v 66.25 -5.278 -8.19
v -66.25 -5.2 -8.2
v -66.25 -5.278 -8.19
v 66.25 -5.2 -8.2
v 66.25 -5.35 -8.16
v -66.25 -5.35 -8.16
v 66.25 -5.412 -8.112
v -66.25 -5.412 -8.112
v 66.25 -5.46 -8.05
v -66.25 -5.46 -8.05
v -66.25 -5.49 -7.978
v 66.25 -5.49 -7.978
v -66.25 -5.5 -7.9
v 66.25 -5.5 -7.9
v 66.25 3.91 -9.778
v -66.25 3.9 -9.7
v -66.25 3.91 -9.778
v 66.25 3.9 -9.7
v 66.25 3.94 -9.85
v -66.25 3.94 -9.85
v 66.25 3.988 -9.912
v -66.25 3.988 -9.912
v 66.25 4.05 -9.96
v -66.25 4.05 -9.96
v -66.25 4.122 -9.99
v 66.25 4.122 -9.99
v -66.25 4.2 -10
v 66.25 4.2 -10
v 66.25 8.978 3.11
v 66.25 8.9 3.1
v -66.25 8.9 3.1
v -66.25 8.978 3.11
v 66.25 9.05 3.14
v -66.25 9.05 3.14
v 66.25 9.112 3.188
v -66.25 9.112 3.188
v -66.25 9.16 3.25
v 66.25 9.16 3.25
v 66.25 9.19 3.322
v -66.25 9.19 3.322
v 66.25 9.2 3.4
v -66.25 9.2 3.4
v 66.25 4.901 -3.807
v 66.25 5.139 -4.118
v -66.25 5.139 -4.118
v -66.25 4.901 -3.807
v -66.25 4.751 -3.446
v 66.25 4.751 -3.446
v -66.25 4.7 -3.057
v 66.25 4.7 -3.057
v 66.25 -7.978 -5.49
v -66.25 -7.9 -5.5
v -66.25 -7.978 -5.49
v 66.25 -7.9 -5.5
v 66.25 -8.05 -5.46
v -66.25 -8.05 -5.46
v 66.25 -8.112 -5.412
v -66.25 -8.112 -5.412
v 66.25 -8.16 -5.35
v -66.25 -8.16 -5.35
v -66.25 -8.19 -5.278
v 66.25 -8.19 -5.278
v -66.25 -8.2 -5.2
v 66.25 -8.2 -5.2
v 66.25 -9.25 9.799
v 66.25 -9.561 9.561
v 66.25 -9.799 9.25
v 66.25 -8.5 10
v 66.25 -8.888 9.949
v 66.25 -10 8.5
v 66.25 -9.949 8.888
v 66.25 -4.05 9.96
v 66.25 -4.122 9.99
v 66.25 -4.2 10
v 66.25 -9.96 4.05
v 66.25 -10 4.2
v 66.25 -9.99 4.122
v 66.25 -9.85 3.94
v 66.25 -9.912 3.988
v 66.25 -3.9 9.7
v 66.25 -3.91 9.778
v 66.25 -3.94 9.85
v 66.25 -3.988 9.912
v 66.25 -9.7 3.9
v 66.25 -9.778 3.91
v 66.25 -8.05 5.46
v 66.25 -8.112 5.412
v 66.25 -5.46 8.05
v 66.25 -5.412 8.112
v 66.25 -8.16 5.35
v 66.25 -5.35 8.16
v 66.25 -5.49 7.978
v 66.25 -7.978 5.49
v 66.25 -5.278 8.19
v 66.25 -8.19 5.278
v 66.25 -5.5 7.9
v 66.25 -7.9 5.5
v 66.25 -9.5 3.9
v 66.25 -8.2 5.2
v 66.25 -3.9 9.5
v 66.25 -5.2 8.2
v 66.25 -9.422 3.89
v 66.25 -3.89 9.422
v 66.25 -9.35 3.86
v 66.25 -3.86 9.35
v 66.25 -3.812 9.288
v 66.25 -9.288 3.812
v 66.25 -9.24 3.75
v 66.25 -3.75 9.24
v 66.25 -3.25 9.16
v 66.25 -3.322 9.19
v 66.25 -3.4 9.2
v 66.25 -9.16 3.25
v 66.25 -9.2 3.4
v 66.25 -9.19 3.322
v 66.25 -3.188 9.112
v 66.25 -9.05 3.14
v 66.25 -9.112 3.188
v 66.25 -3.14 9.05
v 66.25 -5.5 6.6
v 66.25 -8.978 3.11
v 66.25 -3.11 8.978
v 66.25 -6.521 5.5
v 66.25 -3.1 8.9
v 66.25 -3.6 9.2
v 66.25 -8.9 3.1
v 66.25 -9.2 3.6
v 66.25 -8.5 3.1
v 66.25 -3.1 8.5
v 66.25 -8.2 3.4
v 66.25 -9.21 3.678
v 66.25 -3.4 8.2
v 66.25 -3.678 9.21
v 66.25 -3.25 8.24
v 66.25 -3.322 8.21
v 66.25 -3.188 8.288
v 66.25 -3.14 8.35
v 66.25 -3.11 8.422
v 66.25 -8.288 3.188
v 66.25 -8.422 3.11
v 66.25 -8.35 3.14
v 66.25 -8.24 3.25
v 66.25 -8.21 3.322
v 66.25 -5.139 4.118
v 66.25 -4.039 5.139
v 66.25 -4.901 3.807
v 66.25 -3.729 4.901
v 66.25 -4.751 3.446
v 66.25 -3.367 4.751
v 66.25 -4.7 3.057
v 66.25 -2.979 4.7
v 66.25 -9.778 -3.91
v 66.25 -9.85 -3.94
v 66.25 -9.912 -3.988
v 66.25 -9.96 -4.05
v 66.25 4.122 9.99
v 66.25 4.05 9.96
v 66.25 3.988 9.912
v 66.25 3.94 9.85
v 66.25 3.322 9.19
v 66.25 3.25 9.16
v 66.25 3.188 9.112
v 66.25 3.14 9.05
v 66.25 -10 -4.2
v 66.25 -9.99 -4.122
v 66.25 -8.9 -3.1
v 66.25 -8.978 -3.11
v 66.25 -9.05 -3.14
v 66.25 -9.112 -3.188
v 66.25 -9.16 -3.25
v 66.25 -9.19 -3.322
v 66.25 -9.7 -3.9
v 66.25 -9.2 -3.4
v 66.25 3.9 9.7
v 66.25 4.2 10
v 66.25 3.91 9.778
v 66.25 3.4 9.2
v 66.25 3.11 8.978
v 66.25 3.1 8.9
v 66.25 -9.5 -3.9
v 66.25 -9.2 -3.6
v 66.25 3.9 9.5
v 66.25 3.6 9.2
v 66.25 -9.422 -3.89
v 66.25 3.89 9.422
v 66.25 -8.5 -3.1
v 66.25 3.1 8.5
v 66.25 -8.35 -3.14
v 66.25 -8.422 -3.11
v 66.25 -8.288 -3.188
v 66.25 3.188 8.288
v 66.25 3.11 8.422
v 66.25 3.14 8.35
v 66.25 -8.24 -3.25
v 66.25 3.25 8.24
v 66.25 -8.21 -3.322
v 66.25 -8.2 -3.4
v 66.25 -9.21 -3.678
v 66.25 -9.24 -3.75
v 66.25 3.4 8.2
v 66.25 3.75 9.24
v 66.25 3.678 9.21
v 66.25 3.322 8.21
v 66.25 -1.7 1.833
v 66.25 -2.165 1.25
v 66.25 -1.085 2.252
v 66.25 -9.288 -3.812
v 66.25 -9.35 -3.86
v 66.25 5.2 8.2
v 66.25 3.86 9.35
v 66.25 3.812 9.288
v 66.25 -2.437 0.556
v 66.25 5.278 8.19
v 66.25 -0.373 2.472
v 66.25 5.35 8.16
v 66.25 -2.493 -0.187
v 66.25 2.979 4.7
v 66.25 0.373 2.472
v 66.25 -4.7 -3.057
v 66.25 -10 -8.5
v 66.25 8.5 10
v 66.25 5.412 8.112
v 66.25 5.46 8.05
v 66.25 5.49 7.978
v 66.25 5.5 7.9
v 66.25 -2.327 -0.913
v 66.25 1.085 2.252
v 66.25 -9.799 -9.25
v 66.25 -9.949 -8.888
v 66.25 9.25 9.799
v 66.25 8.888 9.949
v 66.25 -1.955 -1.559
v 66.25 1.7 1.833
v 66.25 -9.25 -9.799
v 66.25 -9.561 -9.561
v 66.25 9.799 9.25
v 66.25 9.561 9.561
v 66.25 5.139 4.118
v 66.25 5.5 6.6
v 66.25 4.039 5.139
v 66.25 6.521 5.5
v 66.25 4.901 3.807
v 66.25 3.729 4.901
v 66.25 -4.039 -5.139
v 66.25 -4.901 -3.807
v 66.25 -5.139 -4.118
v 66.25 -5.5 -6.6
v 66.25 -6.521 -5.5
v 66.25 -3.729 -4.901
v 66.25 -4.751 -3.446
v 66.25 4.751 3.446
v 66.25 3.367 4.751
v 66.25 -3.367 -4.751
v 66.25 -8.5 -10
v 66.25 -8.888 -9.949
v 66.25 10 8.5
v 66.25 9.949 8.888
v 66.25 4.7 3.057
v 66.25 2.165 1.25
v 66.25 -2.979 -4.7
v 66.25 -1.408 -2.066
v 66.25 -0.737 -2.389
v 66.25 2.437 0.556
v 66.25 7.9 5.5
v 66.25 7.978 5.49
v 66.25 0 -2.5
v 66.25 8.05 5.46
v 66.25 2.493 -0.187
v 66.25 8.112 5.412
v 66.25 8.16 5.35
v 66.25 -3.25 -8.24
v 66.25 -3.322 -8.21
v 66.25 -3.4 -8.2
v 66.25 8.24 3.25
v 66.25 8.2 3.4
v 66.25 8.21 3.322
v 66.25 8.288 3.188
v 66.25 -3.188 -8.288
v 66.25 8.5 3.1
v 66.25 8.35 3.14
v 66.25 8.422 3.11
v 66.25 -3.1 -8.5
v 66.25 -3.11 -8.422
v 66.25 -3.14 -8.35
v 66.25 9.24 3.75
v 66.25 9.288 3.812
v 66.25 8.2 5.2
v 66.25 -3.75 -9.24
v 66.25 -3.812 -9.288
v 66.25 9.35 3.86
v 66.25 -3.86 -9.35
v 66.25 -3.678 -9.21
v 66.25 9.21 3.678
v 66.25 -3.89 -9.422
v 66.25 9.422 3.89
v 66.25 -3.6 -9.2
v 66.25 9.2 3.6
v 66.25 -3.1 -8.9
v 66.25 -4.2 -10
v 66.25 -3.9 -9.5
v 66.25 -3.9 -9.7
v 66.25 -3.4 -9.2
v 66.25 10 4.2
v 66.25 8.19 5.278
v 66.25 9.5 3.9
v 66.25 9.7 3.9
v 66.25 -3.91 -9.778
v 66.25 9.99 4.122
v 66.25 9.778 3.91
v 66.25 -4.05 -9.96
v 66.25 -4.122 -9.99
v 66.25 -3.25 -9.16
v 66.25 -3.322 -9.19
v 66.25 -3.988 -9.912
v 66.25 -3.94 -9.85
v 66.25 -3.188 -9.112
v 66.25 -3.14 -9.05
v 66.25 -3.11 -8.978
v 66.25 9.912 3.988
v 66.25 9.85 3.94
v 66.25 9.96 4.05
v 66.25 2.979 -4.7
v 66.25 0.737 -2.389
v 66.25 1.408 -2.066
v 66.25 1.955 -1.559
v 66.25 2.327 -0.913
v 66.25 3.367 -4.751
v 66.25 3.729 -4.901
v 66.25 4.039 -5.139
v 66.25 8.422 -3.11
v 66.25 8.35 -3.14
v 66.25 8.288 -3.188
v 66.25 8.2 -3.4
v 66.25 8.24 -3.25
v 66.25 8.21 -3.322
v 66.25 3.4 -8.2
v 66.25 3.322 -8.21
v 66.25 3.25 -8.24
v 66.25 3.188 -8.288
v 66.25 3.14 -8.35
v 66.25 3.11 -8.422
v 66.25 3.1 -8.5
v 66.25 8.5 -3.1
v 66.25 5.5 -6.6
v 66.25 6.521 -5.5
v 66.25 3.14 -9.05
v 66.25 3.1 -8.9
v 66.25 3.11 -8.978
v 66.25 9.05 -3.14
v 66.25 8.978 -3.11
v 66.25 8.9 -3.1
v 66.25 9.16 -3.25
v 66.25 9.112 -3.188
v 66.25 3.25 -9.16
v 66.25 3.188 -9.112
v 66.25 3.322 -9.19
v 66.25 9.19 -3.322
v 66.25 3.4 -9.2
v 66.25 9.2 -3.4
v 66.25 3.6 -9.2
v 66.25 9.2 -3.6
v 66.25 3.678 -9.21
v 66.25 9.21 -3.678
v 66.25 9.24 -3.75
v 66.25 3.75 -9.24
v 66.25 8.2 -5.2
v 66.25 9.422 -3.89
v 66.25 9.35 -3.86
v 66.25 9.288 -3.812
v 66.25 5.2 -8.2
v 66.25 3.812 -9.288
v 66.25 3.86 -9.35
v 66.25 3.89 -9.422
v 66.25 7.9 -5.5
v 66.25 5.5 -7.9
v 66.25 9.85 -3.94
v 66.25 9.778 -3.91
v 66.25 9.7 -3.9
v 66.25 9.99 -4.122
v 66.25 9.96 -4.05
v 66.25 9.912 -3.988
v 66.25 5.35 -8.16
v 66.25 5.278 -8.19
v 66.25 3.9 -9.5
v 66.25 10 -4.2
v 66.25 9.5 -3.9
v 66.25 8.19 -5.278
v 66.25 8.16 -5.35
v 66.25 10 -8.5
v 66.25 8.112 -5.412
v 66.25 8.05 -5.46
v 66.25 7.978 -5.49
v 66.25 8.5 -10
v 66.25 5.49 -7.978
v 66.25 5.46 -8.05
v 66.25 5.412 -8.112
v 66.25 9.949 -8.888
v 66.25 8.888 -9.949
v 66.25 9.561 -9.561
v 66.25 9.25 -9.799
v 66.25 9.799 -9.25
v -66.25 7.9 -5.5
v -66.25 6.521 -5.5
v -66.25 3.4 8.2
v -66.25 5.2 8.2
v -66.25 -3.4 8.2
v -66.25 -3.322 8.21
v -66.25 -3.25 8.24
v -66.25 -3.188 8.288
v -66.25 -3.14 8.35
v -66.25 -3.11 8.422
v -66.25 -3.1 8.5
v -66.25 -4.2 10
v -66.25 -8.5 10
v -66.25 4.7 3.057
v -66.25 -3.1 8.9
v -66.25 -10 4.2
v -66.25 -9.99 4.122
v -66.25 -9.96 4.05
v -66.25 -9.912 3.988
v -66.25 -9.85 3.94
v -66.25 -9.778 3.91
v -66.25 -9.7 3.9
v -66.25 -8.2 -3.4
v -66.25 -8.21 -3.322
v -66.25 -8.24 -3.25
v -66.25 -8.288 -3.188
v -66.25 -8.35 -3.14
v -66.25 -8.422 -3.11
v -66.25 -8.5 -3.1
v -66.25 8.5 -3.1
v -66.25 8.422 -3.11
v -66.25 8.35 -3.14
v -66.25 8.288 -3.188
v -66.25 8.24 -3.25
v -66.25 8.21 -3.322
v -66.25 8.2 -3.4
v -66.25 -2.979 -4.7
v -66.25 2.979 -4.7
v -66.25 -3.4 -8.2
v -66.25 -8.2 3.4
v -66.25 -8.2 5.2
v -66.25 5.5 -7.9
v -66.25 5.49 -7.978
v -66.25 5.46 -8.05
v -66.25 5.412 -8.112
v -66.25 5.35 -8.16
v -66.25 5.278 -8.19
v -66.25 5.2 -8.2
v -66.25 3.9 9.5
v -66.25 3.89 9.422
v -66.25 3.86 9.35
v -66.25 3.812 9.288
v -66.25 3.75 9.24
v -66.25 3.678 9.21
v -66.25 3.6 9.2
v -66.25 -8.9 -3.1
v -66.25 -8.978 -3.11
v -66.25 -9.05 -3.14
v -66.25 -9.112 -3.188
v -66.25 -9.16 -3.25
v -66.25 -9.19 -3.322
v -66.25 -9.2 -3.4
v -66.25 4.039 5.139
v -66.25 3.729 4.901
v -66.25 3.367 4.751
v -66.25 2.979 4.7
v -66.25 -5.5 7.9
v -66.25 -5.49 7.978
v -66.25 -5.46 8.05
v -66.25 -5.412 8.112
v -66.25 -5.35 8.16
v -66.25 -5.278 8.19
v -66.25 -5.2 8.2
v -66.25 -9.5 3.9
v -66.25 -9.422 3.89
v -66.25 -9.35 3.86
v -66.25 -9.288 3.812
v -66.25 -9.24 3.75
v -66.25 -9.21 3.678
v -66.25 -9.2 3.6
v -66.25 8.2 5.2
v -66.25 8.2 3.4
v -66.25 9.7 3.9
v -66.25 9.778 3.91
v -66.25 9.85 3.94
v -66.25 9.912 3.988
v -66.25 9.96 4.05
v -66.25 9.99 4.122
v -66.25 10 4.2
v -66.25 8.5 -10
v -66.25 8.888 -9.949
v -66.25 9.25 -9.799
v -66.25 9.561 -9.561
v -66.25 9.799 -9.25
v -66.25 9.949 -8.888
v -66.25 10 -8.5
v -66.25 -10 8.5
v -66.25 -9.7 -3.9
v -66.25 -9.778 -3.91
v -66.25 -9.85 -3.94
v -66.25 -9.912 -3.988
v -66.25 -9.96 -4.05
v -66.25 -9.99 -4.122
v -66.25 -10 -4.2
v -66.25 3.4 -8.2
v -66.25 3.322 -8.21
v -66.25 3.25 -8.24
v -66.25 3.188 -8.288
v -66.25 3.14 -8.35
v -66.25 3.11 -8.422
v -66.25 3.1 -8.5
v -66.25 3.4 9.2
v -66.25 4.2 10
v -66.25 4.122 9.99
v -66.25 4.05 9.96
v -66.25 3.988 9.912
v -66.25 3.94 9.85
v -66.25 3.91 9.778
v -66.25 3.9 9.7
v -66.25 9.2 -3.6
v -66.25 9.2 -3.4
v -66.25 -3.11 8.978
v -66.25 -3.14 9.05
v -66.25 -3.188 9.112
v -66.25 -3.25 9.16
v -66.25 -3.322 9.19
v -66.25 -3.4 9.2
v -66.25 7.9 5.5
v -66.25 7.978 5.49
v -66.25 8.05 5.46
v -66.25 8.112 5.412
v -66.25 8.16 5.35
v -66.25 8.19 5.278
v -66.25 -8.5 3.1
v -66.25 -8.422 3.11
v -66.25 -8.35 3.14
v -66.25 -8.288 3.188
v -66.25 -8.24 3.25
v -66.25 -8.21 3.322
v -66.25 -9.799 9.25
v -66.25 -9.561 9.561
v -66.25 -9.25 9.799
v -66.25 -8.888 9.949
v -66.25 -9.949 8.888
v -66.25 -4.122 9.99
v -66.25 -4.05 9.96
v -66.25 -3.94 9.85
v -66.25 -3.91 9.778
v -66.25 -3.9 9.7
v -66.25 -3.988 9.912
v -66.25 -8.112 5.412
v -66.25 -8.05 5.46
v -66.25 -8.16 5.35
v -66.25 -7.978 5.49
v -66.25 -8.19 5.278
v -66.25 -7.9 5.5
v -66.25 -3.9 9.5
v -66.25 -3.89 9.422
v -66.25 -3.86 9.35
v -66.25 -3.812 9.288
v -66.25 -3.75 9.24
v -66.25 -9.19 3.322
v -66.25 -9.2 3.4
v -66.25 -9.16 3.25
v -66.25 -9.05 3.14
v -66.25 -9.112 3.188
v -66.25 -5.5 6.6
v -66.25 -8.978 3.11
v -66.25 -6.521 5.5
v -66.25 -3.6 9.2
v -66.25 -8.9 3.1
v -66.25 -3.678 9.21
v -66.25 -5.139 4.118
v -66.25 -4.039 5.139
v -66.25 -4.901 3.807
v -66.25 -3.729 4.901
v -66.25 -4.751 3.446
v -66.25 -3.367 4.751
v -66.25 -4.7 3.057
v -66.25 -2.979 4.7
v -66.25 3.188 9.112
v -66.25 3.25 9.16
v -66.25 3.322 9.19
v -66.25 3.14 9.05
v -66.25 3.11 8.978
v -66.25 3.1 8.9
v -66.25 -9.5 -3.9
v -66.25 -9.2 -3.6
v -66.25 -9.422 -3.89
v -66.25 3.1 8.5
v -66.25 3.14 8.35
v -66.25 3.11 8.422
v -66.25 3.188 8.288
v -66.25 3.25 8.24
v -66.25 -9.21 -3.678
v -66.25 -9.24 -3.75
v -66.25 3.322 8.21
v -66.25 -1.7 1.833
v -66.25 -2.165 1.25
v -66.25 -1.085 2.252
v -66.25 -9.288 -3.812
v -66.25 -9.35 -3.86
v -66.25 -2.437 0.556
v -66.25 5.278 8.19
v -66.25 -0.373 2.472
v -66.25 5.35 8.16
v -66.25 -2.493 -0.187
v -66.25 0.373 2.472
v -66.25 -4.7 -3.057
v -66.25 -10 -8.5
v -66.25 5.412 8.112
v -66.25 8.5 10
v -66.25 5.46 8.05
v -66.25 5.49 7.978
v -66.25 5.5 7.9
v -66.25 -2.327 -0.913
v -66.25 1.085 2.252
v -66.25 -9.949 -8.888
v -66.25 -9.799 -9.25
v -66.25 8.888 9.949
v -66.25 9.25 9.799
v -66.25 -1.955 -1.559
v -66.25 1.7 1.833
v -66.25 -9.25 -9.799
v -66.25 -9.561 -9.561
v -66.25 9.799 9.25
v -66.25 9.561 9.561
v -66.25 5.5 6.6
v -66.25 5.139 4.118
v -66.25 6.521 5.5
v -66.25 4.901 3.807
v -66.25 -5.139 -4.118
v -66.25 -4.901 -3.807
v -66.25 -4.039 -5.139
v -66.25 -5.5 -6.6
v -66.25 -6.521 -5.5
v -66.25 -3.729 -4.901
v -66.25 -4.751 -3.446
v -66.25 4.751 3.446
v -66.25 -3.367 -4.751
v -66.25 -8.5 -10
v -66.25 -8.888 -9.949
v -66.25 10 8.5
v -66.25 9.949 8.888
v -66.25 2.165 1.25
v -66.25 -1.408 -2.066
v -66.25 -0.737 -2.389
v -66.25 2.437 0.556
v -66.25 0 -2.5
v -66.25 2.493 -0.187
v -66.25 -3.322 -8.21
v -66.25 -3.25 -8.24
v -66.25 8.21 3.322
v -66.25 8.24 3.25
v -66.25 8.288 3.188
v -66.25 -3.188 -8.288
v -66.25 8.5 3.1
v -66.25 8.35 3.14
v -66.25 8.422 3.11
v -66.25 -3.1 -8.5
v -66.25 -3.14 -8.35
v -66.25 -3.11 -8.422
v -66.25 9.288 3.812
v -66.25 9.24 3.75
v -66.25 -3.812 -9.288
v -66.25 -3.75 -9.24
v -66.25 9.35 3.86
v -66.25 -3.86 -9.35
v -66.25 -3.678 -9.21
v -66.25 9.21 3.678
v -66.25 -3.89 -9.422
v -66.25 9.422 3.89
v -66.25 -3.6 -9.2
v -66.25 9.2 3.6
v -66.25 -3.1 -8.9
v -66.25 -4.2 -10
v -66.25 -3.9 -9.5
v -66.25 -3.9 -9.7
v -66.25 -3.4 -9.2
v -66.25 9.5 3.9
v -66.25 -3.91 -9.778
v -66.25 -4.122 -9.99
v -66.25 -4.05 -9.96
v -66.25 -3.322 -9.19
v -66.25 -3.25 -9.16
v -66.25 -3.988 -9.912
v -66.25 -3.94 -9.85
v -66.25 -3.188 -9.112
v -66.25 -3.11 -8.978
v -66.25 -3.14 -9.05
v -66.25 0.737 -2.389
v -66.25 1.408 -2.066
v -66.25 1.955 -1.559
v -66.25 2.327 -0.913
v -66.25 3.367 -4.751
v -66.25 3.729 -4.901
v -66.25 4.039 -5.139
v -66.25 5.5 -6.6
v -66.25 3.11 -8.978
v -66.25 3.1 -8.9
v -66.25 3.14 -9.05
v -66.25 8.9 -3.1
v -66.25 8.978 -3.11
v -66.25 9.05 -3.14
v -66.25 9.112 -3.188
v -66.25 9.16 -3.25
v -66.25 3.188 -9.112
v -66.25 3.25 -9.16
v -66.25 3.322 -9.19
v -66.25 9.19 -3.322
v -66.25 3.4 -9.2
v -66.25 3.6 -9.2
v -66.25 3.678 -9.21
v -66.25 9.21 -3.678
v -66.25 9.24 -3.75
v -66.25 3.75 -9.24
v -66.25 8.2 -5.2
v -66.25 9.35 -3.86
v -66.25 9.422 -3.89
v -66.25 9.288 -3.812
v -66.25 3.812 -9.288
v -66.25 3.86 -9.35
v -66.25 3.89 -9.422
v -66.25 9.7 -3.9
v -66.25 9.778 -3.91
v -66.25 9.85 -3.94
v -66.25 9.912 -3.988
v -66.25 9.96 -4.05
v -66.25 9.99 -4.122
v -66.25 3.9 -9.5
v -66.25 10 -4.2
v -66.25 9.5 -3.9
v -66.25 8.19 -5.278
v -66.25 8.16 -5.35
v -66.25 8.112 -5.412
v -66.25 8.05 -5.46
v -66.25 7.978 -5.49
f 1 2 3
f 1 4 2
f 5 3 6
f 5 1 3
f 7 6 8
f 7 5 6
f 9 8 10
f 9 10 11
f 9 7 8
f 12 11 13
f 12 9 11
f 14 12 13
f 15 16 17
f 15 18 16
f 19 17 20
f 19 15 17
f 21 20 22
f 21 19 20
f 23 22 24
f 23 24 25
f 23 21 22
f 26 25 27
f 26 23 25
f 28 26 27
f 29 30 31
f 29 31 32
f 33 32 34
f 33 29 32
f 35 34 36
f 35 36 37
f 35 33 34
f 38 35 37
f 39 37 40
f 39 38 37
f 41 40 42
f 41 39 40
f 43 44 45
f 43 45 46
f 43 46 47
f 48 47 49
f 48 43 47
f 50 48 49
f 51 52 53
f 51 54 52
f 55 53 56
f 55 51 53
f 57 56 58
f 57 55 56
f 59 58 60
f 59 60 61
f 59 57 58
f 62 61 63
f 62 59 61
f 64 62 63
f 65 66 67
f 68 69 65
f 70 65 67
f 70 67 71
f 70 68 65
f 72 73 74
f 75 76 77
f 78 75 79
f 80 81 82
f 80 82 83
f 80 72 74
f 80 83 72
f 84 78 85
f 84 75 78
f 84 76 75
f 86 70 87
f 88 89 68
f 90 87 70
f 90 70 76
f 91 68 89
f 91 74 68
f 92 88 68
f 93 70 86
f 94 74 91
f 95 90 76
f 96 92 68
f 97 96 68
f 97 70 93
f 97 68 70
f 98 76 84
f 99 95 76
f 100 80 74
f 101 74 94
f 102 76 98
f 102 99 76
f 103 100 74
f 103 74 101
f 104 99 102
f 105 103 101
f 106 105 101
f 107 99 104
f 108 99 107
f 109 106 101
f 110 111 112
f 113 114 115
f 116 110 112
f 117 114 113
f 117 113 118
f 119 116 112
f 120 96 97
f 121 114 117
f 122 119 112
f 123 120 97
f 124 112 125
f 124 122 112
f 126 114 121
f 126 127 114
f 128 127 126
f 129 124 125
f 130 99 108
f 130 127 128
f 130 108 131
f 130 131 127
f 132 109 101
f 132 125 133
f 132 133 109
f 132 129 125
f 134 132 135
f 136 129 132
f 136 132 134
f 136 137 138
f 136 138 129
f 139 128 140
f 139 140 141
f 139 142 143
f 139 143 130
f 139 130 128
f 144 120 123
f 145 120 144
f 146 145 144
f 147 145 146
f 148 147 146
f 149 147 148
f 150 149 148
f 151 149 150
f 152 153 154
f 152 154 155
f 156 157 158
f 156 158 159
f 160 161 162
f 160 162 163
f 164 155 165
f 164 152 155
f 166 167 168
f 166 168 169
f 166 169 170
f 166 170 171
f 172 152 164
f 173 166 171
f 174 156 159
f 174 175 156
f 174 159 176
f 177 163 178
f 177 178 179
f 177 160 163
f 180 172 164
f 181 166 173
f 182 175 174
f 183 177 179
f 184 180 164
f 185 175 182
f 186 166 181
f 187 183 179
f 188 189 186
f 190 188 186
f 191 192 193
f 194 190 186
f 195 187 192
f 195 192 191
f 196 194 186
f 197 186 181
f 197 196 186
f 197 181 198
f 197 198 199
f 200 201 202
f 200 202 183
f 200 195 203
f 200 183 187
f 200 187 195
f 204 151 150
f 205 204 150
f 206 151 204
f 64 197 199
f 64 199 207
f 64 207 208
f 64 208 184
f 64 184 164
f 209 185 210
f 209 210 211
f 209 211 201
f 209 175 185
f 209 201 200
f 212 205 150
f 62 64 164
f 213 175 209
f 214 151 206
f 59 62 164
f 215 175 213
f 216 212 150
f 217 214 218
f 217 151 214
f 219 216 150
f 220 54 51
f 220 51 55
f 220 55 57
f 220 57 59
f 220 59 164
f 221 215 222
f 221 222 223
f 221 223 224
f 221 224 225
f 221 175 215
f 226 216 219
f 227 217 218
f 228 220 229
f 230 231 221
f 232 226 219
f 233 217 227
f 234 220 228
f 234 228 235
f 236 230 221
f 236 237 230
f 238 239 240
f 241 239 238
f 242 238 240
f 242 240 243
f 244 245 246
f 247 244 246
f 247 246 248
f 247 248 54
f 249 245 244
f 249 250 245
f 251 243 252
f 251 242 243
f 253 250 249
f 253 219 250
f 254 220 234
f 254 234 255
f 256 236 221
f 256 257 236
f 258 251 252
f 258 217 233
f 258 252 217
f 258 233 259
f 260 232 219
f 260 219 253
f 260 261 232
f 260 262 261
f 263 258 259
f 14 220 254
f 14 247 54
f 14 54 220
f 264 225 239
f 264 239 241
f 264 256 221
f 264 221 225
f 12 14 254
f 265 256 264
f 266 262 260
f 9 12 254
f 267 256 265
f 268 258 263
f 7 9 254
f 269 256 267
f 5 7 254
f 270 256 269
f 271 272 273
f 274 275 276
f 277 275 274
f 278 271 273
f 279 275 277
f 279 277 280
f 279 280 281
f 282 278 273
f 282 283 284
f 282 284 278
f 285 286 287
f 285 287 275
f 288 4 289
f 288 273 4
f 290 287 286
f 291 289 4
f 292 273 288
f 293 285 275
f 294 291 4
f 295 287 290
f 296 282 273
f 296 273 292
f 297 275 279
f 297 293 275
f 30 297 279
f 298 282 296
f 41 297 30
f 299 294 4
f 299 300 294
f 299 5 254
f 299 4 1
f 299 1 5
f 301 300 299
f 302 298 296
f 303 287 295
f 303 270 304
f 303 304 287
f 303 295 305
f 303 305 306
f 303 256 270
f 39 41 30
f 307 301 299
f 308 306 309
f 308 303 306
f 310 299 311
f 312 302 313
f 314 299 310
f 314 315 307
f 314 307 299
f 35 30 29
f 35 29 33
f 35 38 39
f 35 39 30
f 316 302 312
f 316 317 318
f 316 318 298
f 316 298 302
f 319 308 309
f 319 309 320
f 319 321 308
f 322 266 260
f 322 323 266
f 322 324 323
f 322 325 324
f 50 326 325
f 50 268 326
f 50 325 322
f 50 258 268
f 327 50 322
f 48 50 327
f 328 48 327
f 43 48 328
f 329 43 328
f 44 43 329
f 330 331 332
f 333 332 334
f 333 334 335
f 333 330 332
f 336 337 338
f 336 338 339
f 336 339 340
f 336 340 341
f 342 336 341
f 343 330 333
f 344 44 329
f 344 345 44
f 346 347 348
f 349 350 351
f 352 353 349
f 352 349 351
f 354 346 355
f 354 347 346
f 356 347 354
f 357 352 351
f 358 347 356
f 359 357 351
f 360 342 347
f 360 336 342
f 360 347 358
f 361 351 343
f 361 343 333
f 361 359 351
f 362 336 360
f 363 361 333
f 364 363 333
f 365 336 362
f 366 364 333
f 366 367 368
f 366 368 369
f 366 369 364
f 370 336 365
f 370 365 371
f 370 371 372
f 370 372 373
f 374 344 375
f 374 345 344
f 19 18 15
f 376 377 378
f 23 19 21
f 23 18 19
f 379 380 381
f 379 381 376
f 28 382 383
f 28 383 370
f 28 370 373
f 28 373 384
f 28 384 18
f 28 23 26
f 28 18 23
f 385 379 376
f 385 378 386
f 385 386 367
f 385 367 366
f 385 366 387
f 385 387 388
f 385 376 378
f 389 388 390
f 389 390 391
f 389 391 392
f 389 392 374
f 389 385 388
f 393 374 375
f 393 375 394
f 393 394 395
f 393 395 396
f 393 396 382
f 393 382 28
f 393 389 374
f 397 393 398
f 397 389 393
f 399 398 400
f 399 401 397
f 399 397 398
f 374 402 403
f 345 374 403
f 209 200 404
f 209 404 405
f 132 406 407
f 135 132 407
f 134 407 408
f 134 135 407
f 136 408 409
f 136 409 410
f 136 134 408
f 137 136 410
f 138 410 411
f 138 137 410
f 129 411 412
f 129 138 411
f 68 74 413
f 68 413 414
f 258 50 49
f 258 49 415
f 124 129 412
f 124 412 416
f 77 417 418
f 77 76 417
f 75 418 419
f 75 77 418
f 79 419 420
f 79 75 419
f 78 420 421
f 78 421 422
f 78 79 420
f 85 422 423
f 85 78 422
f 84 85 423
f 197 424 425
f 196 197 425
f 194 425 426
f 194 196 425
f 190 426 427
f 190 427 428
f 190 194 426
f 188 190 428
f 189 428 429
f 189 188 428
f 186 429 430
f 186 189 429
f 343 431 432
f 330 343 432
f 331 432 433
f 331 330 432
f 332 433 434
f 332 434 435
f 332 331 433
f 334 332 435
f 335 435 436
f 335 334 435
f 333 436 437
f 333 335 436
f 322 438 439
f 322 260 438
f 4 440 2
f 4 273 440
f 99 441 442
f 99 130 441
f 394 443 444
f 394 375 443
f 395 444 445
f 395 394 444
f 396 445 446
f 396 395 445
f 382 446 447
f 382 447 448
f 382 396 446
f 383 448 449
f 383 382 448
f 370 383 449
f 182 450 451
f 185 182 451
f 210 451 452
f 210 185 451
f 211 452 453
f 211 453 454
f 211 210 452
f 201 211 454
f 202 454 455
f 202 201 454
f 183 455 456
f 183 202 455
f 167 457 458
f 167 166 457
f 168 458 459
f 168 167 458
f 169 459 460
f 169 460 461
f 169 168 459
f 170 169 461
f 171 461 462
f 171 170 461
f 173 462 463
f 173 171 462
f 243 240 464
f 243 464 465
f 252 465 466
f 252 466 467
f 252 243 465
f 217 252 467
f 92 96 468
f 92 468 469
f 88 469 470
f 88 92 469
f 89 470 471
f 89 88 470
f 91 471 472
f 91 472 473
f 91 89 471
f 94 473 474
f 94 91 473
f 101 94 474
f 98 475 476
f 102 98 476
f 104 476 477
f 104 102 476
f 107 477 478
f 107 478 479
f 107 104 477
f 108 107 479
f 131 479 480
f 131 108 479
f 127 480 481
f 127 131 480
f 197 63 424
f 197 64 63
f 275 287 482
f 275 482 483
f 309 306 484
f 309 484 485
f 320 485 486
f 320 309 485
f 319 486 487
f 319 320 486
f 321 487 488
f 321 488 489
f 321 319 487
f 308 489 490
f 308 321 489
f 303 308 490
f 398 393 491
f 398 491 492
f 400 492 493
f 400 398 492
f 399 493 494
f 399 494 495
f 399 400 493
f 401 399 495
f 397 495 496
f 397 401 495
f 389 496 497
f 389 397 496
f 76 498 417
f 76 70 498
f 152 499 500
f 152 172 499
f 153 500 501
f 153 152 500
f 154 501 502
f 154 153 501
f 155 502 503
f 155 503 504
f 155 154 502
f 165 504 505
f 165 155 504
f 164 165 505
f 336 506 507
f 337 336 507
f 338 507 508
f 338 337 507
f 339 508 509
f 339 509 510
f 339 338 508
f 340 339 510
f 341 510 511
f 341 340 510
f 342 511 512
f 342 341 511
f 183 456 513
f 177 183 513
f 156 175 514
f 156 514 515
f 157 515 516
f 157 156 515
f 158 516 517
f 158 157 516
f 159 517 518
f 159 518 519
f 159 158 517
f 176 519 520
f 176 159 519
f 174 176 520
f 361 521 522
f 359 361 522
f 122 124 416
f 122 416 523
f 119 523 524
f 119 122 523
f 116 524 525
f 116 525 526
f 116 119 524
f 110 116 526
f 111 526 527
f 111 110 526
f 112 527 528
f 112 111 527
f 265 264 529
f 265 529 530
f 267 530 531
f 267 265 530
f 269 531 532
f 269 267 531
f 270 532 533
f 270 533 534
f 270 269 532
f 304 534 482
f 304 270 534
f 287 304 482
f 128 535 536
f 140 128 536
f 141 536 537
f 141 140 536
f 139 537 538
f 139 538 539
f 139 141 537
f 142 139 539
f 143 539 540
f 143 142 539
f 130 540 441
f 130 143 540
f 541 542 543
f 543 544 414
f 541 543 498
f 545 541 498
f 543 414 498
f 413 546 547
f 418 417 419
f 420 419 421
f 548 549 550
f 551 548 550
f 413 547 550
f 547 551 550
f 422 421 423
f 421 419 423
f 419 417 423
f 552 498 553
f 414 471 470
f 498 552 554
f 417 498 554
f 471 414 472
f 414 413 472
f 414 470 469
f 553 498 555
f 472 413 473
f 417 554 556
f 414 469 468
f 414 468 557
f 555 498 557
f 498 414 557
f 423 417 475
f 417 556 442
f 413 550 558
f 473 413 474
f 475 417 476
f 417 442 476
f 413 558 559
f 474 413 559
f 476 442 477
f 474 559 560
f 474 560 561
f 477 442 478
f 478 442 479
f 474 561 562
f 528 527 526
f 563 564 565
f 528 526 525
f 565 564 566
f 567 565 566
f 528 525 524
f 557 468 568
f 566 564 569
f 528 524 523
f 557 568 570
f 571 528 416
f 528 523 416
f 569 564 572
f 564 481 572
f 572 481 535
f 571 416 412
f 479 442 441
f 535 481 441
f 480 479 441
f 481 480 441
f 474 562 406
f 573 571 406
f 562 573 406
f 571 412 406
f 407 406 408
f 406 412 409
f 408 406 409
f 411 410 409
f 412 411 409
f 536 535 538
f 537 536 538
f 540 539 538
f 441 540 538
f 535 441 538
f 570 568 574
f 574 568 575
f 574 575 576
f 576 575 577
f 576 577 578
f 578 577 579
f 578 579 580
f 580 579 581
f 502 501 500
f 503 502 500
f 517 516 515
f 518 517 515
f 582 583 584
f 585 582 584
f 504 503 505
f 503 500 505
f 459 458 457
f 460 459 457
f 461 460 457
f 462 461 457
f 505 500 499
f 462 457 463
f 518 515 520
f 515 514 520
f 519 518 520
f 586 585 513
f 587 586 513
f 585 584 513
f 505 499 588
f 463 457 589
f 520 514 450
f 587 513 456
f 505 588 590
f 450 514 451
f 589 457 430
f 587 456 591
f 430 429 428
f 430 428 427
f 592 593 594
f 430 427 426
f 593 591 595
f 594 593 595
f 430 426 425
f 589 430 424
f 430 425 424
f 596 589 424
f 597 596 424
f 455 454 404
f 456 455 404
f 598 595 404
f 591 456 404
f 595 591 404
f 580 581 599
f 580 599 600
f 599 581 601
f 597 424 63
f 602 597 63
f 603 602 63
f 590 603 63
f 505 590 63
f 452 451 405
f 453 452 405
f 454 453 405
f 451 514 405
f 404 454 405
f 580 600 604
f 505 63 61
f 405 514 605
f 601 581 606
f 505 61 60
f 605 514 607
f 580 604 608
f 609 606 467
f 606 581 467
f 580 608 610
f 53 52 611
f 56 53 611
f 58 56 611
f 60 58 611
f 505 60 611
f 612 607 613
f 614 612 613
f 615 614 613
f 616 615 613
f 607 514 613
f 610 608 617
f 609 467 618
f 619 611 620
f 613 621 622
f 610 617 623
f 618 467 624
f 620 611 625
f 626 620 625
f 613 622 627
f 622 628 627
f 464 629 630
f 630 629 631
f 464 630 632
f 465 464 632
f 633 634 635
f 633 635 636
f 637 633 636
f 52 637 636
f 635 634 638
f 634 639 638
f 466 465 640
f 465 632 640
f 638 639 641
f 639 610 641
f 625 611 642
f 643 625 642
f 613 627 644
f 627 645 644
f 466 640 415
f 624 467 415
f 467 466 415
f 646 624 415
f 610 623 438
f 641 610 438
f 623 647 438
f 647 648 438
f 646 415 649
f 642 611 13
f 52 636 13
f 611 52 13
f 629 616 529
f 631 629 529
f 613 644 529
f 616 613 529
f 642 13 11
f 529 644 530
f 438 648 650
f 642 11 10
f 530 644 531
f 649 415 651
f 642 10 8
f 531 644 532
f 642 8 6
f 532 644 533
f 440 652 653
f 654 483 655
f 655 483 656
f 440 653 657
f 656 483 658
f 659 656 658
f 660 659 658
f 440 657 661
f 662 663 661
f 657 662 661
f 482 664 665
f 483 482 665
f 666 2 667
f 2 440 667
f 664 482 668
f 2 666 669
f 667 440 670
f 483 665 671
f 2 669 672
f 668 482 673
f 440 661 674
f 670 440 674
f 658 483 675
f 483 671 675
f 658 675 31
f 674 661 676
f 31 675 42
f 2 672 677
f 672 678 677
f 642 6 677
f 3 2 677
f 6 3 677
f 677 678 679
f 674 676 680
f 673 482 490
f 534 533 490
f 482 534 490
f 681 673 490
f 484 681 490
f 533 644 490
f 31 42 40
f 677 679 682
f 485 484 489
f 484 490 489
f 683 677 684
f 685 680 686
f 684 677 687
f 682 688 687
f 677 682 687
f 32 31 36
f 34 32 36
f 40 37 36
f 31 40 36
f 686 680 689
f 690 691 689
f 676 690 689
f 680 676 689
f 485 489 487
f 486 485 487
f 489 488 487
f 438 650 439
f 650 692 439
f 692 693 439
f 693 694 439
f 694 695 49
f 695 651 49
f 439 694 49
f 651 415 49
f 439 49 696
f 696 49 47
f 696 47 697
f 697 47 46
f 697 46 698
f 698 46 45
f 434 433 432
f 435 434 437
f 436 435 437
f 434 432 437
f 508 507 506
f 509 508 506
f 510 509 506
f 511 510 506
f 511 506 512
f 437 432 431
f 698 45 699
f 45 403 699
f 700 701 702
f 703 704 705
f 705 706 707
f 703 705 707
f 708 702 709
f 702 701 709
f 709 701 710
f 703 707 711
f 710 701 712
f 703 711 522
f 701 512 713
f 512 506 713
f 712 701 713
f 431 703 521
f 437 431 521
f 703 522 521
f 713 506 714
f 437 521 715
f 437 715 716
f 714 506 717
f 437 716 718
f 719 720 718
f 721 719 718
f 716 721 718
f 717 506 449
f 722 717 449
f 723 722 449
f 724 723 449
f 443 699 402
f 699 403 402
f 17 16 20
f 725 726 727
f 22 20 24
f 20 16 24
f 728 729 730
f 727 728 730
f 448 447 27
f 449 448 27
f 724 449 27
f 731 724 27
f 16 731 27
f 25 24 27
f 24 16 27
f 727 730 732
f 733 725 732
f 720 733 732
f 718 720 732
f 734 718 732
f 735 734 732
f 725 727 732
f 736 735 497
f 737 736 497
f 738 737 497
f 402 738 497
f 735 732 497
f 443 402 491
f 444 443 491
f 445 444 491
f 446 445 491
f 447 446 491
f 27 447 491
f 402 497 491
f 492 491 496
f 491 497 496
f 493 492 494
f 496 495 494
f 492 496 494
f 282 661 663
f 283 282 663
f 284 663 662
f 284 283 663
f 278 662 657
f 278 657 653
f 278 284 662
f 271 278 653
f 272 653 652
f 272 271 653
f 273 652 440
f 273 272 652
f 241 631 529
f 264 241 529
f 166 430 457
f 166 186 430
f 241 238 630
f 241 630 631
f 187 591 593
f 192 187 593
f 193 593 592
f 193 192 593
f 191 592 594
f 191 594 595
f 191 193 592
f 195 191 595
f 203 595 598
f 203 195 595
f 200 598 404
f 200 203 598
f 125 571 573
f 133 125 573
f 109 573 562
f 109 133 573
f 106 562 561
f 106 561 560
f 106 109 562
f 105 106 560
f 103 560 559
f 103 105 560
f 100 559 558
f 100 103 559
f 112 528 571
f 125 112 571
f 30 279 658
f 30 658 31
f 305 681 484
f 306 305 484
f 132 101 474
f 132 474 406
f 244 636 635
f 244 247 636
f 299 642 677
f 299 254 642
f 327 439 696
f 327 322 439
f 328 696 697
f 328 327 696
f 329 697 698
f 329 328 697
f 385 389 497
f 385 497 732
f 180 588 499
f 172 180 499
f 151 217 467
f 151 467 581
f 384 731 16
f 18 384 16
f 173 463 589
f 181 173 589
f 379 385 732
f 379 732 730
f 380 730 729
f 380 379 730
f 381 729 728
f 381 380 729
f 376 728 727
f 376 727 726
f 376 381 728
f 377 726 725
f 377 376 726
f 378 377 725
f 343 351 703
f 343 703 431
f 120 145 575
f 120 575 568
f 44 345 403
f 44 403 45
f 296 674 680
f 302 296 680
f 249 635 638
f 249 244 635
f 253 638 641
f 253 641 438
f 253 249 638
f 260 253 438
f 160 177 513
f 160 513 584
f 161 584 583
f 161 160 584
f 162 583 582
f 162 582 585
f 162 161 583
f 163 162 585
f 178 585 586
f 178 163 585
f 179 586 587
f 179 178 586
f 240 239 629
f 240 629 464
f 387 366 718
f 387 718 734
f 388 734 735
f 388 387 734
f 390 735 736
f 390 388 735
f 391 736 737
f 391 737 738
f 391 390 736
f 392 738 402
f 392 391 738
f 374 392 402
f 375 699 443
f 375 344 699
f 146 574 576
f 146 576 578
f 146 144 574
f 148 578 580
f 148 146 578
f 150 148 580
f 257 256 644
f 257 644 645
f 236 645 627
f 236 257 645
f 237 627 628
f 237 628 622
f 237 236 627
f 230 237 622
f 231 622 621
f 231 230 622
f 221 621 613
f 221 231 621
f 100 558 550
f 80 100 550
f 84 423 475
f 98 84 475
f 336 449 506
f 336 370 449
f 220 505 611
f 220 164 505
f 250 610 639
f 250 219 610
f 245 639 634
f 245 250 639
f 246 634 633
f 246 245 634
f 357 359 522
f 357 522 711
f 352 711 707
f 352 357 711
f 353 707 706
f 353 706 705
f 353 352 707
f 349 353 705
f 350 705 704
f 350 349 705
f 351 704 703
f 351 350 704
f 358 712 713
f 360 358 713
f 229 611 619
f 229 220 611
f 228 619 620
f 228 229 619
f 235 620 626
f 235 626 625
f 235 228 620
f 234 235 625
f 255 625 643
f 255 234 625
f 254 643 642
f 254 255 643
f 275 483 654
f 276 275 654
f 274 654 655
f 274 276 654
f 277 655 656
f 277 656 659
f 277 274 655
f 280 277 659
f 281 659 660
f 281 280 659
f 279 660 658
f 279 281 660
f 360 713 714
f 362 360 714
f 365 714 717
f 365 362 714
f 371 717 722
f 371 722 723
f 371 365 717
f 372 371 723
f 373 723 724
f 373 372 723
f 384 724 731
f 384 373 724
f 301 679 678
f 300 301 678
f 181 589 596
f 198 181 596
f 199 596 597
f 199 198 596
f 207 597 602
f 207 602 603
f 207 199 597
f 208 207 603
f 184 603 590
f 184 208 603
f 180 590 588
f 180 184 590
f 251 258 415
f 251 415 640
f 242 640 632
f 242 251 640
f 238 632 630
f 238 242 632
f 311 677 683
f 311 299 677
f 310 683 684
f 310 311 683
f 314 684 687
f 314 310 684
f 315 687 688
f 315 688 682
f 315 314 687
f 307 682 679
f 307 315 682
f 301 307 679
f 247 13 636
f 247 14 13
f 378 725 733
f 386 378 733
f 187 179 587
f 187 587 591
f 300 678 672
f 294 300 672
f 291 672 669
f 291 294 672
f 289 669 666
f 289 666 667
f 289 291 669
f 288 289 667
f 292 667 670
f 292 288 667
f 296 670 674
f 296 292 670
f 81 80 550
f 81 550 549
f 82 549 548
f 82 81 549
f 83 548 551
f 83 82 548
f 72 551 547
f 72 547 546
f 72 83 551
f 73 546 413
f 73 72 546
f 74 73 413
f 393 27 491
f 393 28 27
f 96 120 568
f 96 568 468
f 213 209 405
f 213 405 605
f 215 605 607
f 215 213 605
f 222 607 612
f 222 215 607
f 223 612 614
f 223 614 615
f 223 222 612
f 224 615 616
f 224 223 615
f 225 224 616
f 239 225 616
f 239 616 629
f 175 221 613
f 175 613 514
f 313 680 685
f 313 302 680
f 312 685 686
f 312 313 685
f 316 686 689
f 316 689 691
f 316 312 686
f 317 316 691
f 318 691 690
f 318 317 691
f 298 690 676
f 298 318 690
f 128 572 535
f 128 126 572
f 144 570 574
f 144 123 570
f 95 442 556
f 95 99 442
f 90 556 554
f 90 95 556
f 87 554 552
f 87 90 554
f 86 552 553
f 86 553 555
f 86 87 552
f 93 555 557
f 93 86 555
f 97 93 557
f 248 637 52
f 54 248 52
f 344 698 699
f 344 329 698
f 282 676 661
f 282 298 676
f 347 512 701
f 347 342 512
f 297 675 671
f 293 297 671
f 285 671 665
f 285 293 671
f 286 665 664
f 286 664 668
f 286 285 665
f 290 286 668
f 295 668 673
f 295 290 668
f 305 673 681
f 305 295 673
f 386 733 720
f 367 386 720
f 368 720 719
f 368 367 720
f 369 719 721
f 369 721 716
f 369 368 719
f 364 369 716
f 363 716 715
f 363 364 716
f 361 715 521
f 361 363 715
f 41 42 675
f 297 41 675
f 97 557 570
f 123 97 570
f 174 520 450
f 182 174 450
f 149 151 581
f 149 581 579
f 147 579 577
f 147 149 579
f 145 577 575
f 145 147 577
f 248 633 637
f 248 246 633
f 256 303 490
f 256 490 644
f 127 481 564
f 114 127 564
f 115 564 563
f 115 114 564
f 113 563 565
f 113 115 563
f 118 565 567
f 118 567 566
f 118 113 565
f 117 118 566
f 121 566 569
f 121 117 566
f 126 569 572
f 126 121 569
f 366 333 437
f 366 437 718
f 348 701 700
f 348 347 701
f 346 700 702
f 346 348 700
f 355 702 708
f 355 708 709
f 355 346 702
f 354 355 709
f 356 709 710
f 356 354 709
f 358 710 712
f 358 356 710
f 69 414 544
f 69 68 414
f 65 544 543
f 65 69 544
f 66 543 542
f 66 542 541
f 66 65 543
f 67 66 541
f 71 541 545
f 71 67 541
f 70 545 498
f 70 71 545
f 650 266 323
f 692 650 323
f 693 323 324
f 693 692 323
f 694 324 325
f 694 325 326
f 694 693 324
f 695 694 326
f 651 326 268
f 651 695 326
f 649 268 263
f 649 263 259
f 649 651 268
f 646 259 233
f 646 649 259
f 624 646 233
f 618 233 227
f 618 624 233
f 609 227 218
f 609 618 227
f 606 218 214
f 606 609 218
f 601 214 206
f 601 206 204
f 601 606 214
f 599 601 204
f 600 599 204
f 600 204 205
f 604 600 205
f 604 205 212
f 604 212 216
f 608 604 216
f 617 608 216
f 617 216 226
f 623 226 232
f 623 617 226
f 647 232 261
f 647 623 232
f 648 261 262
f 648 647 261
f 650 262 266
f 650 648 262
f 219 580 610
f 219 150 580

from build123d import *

# Parameters (mm, degrees)
SKETCH1_R           = 2.5
BOSS_EXTRUDE2_DEPTH = 66.25


with BuildPart() as part:
    # Sketch1 → Boss-Extrude2 (new, symmetric)
    with BuildSketch(Plane(origin=(0, 0, 0), x_dir=(0, 0, -1), z_dir=(1, 0, 0))):
        with BuildLine():
            Line((10, 4.2), (10, 8.5))
            ThreePointArc((10, 8.5), (9.560660172, 9.560660172), (8.5, 10))
            Line((8.5, 10), (4.2, 10))
            ThreePointArc((4.2, 10), (3.987867966, 9.912132034), (3.9, 9.7))
            Line((3.9, 9.7), (3.9, 9.5))
            ThreePointArc((3.9, 9.5), (3.812132034, 9.287867966), (3.6, 9.2))
            Line((3.6, 9.2), (3.4, 9.2))
            ThreePointArc((3.4, 9.2), (3.187867966, 9.112132034), (3.1, 8.9))
            Line((3.1, 8.9), (3.1, 8.5))
            ThreePointArc((3.1, 8.5), (3.187867966, 8.287867966), (3.4, 8.2))
            Line((3.4, 8.2), (5.2, 8.2))
            ThreePointArc((5.2, 8.2), (5.412132034, 8.112132034), (5.5, 7.9))
            Line((5.5, 7.9), (5.5, 6.521320344))
            Line((5.5, 6.521320344), (4.118019485, 5.139339828))
            ThreePointArc((4.118019485, 5.139339828), (3.631384461, 4.814180701), (3.057359313, 4.7))
            Line((3.057359313, 4.7), (-3.057359313, 4.7))
            ThreePointArc((-3.057359313, 4.7), (-3.631384461, 4.814180701), (-4.118019485, 5.139339828))
            Line((-4.118019485, 5.139339828), (-5.5, 6.521320344))
            Line((-5.5, 6.521320344), (-5.5, 7.9))
            ThreePointArc((-5.5, 7.9), (-5.412132034, 8.112132034), (-5.2, 8.2))
            Line((-5.2, 8.2), (-3.4, 8.2))
            ThreePointArc((-3.4, 8.2), (-3.187867966, 8.287867966), (-3.1, 8.5))
            Line((-3.1, 8.5), (-3.1, 8.9))
            ThreePointArc((-3.1, 8.9), (-3.187867966, 9.112132034), (-3.4, 9.2))
            Line((-3.4, 9.2), (-3.6, 9.2))
            ThreePointArc((-3.6, 9.2), (-3.812132034, 9.287867966), (-3.9, 9.5))
            Line((-3.9, 9.5), (-3.9, 9.7))
            ThreePointArc((-3.9, 9.7), (-3.987867966, 9.912132034), (-4.2, 10))
            Line((-4.2, 10), (-8.5, 10))
            ThreePointArc((-8.5, 10), (-9.560660172, 9.560660172), (-10, 8.5))
            Line((-10, 8.5), (-10, 4.2))
            ThreePointArc((-10, 4.2), (-9.912132034, 3.987867966), (-9.7, 3.9))
            Line((-9.7, 3.9), (-9.5, 3.9))
            ThreePointArc((-9.5, 3.9), (-9.287867966, 3.812132034), (-9.2, 3.6))
            Line((-9.2, 3.6), (-9.2, 3.4))
            ThreePointArc((-9.2, 3.4), (-9.112132034, 3.187867966), (-8.9, 3.1))
            Line((-8.9, 3.1), (-8.5, 3.1))
            ThreePointArc((-8.5, 3.1), (-8.287867966, 3.187867966), (-8.2, 3.4))
            Line((-8.2, 3.4), (-8.2, 5.2))
            ThreePointArc((-8.2, 5.2), (-8.112132034, 5.412132034), (-7.9, 5.5))
            Line((-7.9, 5.5), (-6.6, 5.5))
            Line((-6.6, 5.5), (-5.139339828, 4.039339828))
            ThreePointArc((-5.139339828, 4.039339828), (-4.814180701, 3.552704805), (-4.7, 2.978679656))
            Line((-4.7, 2.978679656), (-4.7, -2.978679656))
            ThreePointArc((-4.7, -2.978679656), (-4.814180701, -3.552704805), (-5.139339828, -4.039339828))
            Line((-5.139339828, -4.039339828), (-6.6, -5.5))
            Line((-6.6, -5.5), (-7.9, -5.5))
            ThreePointArc((-7.9, -5.5), (-8.112132034, -5.412132034), (-8.2, -5.2))
            Line((-8.2, -5.2), (-8.2, -3.4))
            ThreePointArc((-8.2, -3.4), (-8.287867966, -3.187867966), (-8.5, -3.1))
            Line((-8.5, -3.1), (-8.9, -3.1))
            ThreePointArc((-8.9, -3.1), (-9.112132034, -3.187867966), (-9.2, -3.4))
            Line((-9.2, -3.4), (-9.2, -3.6))
            ThreePointArc((-9.2, -3.6), (-9.287867966, -3.812132034), (-9.5, -3.9))
            Line((-9.5, -3.9), (-9.7, -3.9))
            ThreePointArc((-9.7, -3.9), (-9.912132034, -3.987867966), (-10, -4.2))
            Line((-10, -4.2), (-10, -8.5))
            ThreePointArc((-10, -8.5), (-9.560660172, -9.560660172), (-8.5, -10))
            Line((-8.5, -10), (-4.2, -10))
            ThreePointArc((-4.2, -10), (-3.987867966, -9.912132034), (-3.9, -9.7))
            Line((-3.9, -9.7), (-3.9, -9.5))
            ThreePointArc((-3.9, -9.5), (-3.812132034, -9.287867966), (-3.6, -9.2))
            Line((-3.6, -9.2), (-3.4, -9.2))
            ThreePointArc((-3.4, -9.2), (-3.187867966, -9.112132034), (-3.1, -8.9))
            Line((-3.1, -8.9), (-3.1, -8.5))
            ThreePointArc((-3.1, -8.5), (-3.187867966, -8.287867966), (-3.4, -8.2))
            Line((-3.4, -8.2), (-5.2, -8.2))
            ThreePointArc((-5.2, -8.2), (-5.412132034, -8.112132034), (-5.5, -7.9))
            Line((-5.5, -7.9), (-5.5, -6.521320344))
            Line((-5.5, -6.521320344), (-4.118019485, -5.139339828))
            ThreePointArc((-4.118019485, -5.139339828), (-3.631384461, -4.814180701), (-3.057359313, -4.7))
            Line((-3.057359313, -4.7), (3.057359313, -4.7))
            ThreePointArc((3.057359313, -4.7), (3.631384461, -4.814180701), (4.118019485, -5.139339828))
            Line((4.118019485, -5.139339828), (5.5, -6.521320344))
            Line((5.5, -6.521320344), (5.5, -7.9))
            ThreePointArc((5.5, -7.9), (5.412132034, -8.112132034), (5.2, -8.2))
            Line((5.2, -8.2), (3.4, -8.2))
            ThreePointArc((3.4, -8.2), (3.187867966, -8.287867966), (3.1, -8.5))
            Line((3.1, -8.5), (3.1, -8.9))
            ThreePointArc((3.1, -8.9), (3.187867966, -9.112132034), (3.4, -9.2))
            Line((3.4, -9.2), (3.6, -9.2))
            ThreePointArc((3.6, -9.2), (3.812132034, -9.287867966), (3.9, -9.5))
            Line((3.9, -9.5), (3.9, -9.7))
            ThreePointArc((3.9, -9.7), (3.987867966, -9.912132034), (4.2, -10))
            Line((4.2, -10), (8.5, -10))
            ThreePointArc((8.5, -10), (9.560660172, -9.560660172), (10, -8.5))
            Line((10, -8.5), (10, -4.2))
            ThreePointArc((10, -4.2), (9.912132034, -3.987867966), (9.7, -3.9))
            Line((9.7, -3.9), (9.5, -3.9))
            ThreePointArc((9.5, -3.9), (9.287867966, -3.812132034), (9.2, -3.6))
            Line((9.2, -3.6), (9.2, -3.4))
            ThreePointArc((9.2, -3.4), (9.112132034, -3.187867966), (8.9, -3.1))
            Line((8.9, -3.1), (8.5, -3.1))
            ThreePointArc((8.5, -3.1), (8.287867966, -3.187867966), (8.2, -3.4))
            Line((8.2, -3.4), (8.2, -5.2))
            ThreePointArc((8.2, -5.2), (8.112132034, -5.412132034), (7.9, -5.5))
            Line((7.9, -5.5), (6.6, -5.5))
            Line((6.6, -5.5), (5.139339828, -4.039339828))
            ThreePointArc((5.139339828, -4.039339828), (4.814180701, -3.552704805), (4.7, -2.978679656))
            Line((4.7, -2.978679656), (4.7, 2.978679656))
            ThreePointArc((4.7, 2.978679656), (4.814180701, 3.552704805), (5.139339828, 4.039339828))
            Line((5.139339828, 4.039339828), (6.6, 5.5))
            Line((6.6, 5.5), (7.9, 5.5))
            ThreePointArc((7.9, 5.5), (8.112132034, 5.412132034), (8.2, 5.2))
            Line((8.2, 5.2), (8.2, 3.4))
            ThreePointArc((8.2, 3.4), (8.287867966, 3.187867966), (8.5, 3.1))
            Line((8.5, 3.1), (8.9, 3.1))
            ThreePointArc((8.9, 3.1), (9.112132034, 3.187867966), (9.2, 3.4))
            Line((9.2, 3.4), (9.2, 3.6))
            ThreePointArc((9.2, 3.6), (9.287867966, 3.812132034), (9.5, 3.9))
            Line((9.5, 3.9), (9.7, 3.9))
            ThreePointArc((9.7, 3.9), (9.912132034, 3.987867966), (10, 4.2))
        make_face()
        Circle(SKETCH1_R, mode=Mode.SUBTRACT)
    extrude(amount=BOSS_EXTRUDE2_DEPTH, both=True)


solid = part.part
